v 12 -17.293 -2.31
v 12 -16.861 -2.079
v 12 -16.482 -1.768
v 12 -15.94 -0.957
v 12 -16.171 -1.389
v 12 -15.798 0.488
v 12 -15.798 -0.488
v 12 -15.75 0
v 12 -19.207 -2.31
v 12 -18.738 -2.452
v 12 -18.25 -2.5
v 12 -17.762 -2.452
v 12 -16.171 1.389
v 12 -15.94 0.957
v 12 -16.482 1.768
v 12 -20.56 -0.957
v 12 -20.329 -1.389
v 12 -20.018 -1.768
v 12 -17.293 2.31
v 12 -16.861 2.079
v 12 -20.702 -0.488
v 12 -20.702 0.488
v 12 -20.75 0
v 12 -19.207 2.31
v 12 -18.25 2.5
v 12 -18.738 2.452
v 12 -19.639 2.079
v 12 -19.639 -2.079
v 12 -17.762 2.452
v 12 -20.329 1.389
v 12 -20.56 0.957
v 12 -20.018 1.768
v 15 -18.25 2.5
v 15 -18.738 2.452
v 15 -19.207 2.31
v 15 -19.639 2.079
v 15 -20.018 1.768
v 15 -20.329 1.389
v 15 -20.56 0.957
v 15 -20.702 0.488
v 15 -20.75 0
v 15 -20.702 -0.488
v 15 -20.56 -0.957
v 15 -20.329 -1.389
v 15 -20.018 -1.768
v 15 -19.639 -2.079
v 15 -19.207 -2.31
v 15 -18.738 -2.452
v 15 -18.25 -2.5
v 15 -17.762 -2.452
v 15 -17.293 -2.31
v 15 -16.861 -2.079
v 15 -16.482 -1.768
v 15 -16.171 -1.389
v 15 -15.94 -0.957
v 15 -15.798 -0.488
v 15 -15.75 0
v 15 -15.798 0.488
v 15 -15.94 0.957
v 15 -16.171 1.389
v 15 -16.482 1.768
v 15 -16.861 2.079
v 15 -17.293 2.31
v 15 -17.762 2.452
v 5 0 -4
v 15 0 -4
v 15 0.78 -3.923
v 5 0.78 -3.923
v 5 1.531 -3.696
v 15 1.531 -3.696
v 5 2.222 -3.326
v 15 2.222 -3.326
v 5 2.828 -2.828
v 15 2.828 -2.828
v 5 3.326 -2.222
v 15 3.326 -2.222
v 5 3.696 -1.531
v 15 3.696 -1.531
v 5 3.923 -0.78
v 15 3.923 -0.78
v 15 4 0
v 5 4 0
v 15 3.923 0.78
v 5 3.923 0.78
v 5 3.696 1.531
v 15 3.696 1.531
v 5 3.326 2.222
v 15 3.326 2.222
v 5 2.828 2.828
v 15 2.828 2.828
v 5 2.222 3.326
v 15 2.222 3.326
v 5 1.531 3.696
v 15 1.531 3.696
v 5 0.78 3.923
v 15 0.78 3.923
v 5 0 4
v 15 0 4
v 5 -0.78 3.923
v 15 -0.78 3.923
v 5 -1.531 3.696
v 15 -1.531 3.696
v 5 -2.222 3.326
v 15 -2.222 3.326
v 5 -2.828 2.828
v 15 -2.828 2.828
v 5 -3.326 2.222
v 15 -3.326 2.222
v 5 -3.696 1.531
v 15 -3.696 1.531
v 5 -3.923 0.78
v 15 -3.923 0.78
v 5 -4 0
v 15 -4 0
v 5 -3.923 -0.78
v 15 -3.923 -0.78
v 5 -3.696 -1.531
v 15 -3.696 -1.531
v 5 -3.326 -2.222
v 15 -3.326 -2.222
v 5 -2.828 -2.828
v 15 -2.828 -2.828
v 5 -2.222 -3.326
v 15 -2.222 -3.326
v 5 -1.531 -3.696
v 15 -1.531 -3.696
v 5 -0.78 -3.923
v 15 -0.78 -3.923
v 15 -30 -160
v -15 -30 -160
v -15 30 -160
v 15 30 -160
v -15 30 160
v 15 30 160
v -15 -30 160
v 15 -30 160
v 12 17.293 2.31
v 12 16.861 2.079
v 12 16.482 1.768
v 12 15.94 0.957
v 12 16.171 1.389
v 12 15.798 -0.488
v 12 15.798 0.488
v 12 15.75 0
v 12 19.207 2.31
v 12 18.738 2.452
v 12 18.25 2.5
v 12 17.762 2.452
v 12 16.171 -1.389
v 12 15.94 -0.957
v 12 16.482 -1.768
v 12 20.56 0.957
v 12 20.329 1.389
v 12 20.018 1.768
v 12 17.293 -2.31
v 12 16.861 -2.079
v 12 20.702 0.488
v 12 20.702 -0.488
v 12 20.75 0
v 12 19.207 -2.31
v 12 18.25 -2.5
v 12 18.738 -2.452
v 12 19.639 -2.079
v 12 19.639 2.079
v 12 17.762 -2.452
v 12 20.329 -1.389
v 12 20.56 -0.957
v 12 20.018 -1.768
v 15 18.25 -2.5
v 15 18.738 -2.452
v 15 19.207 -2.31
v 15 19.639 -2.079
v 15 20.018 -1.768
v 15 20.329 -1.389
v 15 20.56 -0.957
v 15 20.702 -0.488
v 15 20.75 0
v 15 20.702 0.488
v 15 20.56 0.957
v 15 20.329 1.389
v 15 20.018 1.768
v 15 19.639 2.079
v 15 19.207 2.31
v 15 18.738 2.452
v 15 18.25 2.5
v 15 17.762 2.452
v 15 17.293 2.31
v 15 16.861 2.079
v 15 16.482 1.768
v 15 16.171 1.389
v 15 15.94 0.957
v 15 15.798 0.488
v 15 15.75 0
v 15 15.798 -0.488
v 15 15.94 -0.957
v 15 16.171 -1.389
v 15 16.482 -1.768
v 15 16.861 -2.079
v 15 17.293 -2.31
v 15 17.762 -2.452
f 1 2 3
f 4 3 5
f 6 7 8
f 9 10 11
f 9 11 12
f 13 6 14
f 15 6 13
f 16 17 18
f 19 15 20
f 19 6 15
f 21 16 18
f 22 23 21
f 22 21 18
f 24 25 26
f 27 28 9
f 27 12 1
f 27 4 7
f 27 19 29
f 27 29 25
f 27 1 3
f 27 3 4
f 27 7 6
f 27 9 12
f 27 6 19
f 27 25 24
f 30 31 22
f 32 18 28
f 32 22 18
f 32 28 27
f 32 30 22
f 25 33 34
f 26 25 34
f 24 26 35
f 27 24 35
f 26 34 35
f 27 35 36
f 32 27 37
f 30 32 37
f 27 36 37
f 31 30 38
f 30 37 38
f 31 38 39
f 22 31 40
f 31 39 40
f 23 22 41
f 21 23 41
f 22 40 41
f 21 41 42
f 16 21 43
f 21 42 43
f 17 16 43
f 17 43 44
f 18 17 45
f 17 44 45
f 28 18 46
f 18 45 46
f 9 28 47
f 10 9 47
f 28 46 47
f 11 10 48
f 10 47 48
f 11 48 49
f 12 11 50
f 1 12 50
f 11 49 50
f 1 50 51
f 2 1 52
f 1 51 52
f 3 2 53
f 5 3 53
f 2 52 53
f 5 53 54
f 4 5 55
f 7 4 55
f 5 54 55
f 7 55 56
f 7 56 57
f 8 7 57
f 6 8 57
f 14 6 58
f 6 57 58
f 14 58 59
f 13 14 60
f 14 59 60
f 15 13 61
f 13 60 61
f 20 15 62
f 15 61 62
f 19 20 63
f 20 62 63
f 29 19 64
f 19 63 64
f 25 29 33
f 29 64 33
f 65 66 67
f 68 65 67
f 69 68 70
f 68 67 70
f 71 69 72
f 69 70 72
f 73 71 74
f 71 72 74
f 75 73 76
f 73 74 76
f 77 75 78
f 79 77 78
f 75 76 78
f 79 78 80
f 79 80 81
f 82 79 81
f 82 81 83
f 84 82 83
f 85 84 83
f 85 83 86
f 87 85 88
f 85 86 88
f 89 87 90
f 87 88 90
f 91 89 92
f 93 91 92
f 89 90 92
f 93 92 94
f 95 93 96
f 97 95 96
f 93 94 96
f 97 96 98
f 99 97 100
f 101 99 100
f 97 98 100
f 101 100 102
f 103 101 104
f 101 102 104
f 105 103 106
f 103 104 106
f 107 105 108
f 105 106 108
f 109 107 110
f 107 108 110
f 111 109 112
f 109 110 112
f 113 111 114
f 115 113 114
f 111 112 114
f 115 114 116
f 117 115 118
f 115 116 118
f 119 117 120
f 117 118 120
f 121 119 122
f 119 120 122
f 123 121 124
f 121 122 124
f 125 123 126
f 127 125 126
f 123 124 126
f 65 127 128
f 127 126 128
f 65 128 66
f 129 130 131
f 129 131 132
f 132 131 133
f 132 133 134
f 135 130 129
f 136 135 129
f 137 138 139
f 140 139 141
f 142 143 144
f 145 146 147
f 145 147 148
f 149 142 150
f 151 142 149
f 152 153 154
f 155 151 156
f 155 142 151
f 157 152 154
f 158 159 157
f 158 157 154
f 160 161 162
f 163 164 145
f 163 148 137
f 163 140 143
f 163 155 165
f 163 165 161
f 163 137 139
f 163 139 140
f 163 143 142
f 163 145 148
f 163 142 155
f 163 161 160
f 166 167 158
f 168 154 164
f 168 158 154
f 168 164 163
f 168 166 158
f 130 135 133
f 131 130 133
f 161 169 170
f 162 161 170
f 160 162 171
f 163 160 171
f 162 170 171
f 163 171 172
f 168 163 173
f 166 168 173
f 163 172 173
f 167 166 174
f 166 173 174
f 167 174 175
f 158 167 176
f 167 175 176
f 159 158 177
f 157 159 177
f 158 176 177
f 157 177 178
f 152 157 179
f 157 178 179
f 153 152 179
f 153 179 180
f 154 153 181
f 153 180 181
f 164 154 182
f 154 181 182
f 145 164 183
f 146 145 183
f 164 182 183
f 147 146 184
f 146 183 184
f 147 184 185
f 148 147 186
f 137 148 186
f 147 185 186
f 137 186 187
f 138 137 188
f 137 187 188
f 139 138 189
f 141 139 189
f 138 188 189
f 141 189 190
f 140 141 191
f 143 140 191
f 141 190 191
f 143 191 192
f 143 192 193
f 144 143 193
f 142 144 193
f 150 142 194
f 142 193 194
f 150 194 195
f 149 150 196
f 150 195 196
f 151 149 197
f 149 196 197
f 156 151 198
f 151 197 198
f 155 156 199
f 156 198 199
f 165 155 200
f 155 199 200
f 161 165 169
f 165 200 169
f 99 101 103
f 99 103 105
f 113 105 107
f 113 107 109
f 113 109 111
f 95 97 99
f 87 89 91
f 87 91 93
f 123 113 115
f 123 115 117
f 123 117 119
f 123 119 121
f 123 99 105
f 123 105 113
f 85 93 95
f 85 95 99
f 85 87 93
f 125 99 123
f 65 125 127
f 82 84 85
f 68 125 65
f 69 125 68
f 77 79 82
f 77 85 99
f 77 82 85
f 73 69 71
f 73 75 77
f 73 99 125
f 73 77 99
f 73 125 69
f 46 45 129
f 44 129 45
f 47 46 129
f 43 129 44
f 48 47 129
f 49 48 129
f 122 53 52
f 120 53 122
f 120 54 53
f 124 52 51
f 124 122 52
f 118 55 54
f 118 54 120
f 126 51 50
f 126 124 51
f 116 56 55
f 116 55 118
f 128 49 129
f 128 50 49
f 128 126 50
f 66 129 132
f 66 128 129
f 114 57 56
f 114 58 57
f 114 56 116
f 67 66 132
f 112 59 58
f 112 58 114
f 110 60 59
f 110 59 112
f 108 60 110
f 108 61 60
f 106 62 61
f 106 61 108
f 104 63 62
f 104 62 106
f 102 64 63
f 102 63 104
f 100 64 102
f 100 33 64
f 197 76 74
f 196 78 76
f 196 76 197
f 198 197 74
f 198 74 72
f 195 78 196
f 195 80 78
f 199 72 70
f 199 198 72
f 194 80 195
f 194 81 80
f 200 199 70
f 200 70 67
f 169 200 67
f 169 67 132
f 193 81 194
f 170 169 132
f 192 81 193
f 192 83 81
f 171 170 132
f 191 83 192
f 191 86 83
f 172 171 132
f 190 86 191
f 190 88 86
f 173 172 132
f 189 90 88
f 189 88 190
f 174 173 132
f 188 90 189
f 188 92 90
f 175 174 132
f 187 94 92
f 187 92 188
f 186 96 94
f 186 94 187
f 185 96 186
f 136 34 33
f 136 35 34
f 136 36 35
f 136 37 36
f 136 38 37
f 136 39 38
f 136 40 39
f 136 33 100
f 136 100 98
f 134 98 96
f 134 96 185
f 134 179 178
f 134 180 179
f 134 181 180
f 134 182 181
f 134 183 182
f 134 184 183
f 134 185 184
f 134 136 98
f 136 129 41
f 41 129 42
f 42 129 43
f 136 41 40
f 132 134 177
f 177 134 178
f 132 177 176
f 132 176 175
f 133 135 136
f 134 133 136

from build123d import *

# Parameters (mm, degrees)
SKETCH1_W           = 30
SKETCH1_H           = 60
BOSS_EXTRUDE1_DEPTH = 160
SKETCH2_R           = 2.5
CUT_EXTRUDE1_DEPTH  = 3
SKETCH3_R           = 4
CUT_EXTRUDE2_DEPTH  = 10


with BuildPart() as part:
    # Sketch1 → Boss-Extrude1 (new, symmetric)
    with BuildSketch(Plane.XY):
        Rectangle(SKETCH1_W, SKETCH1_H)
    extrude(amount=BOSS_EXTRUDE1_DEPTH, both=True)

    # Sketch2 → Cut-Extrude1 (cut)
    with BuildSketch(Plane(origin=(15, 0, 0), x_dir=(0, 0, -1), z_dir=(1, 0, 0))):
        with Locations((0, 18.25)):
            Circle(SKETCH2_R)
        with Locations(Location((0, -18.25, 0), (0, 0, 180))):
            Circle(SKETCH2_R)
    extrude(amount=-CUT_EXTRUDE1_DEPTH, mode=Mode.SUBTRACT)

    # Sketch3 → Cut-Extrude2 (cut)
    with BuildSketch(Plane(origin=(15, 0, 0), x_dir=(0, 0, -1), z_dir=(1, 0, 0))):
        Circle(SKETCH3_R)
    extrude(amount=-CUT_EXTRUDE2_DEPTH, mode=Mode.SUBTRACT)


solid = part.part
